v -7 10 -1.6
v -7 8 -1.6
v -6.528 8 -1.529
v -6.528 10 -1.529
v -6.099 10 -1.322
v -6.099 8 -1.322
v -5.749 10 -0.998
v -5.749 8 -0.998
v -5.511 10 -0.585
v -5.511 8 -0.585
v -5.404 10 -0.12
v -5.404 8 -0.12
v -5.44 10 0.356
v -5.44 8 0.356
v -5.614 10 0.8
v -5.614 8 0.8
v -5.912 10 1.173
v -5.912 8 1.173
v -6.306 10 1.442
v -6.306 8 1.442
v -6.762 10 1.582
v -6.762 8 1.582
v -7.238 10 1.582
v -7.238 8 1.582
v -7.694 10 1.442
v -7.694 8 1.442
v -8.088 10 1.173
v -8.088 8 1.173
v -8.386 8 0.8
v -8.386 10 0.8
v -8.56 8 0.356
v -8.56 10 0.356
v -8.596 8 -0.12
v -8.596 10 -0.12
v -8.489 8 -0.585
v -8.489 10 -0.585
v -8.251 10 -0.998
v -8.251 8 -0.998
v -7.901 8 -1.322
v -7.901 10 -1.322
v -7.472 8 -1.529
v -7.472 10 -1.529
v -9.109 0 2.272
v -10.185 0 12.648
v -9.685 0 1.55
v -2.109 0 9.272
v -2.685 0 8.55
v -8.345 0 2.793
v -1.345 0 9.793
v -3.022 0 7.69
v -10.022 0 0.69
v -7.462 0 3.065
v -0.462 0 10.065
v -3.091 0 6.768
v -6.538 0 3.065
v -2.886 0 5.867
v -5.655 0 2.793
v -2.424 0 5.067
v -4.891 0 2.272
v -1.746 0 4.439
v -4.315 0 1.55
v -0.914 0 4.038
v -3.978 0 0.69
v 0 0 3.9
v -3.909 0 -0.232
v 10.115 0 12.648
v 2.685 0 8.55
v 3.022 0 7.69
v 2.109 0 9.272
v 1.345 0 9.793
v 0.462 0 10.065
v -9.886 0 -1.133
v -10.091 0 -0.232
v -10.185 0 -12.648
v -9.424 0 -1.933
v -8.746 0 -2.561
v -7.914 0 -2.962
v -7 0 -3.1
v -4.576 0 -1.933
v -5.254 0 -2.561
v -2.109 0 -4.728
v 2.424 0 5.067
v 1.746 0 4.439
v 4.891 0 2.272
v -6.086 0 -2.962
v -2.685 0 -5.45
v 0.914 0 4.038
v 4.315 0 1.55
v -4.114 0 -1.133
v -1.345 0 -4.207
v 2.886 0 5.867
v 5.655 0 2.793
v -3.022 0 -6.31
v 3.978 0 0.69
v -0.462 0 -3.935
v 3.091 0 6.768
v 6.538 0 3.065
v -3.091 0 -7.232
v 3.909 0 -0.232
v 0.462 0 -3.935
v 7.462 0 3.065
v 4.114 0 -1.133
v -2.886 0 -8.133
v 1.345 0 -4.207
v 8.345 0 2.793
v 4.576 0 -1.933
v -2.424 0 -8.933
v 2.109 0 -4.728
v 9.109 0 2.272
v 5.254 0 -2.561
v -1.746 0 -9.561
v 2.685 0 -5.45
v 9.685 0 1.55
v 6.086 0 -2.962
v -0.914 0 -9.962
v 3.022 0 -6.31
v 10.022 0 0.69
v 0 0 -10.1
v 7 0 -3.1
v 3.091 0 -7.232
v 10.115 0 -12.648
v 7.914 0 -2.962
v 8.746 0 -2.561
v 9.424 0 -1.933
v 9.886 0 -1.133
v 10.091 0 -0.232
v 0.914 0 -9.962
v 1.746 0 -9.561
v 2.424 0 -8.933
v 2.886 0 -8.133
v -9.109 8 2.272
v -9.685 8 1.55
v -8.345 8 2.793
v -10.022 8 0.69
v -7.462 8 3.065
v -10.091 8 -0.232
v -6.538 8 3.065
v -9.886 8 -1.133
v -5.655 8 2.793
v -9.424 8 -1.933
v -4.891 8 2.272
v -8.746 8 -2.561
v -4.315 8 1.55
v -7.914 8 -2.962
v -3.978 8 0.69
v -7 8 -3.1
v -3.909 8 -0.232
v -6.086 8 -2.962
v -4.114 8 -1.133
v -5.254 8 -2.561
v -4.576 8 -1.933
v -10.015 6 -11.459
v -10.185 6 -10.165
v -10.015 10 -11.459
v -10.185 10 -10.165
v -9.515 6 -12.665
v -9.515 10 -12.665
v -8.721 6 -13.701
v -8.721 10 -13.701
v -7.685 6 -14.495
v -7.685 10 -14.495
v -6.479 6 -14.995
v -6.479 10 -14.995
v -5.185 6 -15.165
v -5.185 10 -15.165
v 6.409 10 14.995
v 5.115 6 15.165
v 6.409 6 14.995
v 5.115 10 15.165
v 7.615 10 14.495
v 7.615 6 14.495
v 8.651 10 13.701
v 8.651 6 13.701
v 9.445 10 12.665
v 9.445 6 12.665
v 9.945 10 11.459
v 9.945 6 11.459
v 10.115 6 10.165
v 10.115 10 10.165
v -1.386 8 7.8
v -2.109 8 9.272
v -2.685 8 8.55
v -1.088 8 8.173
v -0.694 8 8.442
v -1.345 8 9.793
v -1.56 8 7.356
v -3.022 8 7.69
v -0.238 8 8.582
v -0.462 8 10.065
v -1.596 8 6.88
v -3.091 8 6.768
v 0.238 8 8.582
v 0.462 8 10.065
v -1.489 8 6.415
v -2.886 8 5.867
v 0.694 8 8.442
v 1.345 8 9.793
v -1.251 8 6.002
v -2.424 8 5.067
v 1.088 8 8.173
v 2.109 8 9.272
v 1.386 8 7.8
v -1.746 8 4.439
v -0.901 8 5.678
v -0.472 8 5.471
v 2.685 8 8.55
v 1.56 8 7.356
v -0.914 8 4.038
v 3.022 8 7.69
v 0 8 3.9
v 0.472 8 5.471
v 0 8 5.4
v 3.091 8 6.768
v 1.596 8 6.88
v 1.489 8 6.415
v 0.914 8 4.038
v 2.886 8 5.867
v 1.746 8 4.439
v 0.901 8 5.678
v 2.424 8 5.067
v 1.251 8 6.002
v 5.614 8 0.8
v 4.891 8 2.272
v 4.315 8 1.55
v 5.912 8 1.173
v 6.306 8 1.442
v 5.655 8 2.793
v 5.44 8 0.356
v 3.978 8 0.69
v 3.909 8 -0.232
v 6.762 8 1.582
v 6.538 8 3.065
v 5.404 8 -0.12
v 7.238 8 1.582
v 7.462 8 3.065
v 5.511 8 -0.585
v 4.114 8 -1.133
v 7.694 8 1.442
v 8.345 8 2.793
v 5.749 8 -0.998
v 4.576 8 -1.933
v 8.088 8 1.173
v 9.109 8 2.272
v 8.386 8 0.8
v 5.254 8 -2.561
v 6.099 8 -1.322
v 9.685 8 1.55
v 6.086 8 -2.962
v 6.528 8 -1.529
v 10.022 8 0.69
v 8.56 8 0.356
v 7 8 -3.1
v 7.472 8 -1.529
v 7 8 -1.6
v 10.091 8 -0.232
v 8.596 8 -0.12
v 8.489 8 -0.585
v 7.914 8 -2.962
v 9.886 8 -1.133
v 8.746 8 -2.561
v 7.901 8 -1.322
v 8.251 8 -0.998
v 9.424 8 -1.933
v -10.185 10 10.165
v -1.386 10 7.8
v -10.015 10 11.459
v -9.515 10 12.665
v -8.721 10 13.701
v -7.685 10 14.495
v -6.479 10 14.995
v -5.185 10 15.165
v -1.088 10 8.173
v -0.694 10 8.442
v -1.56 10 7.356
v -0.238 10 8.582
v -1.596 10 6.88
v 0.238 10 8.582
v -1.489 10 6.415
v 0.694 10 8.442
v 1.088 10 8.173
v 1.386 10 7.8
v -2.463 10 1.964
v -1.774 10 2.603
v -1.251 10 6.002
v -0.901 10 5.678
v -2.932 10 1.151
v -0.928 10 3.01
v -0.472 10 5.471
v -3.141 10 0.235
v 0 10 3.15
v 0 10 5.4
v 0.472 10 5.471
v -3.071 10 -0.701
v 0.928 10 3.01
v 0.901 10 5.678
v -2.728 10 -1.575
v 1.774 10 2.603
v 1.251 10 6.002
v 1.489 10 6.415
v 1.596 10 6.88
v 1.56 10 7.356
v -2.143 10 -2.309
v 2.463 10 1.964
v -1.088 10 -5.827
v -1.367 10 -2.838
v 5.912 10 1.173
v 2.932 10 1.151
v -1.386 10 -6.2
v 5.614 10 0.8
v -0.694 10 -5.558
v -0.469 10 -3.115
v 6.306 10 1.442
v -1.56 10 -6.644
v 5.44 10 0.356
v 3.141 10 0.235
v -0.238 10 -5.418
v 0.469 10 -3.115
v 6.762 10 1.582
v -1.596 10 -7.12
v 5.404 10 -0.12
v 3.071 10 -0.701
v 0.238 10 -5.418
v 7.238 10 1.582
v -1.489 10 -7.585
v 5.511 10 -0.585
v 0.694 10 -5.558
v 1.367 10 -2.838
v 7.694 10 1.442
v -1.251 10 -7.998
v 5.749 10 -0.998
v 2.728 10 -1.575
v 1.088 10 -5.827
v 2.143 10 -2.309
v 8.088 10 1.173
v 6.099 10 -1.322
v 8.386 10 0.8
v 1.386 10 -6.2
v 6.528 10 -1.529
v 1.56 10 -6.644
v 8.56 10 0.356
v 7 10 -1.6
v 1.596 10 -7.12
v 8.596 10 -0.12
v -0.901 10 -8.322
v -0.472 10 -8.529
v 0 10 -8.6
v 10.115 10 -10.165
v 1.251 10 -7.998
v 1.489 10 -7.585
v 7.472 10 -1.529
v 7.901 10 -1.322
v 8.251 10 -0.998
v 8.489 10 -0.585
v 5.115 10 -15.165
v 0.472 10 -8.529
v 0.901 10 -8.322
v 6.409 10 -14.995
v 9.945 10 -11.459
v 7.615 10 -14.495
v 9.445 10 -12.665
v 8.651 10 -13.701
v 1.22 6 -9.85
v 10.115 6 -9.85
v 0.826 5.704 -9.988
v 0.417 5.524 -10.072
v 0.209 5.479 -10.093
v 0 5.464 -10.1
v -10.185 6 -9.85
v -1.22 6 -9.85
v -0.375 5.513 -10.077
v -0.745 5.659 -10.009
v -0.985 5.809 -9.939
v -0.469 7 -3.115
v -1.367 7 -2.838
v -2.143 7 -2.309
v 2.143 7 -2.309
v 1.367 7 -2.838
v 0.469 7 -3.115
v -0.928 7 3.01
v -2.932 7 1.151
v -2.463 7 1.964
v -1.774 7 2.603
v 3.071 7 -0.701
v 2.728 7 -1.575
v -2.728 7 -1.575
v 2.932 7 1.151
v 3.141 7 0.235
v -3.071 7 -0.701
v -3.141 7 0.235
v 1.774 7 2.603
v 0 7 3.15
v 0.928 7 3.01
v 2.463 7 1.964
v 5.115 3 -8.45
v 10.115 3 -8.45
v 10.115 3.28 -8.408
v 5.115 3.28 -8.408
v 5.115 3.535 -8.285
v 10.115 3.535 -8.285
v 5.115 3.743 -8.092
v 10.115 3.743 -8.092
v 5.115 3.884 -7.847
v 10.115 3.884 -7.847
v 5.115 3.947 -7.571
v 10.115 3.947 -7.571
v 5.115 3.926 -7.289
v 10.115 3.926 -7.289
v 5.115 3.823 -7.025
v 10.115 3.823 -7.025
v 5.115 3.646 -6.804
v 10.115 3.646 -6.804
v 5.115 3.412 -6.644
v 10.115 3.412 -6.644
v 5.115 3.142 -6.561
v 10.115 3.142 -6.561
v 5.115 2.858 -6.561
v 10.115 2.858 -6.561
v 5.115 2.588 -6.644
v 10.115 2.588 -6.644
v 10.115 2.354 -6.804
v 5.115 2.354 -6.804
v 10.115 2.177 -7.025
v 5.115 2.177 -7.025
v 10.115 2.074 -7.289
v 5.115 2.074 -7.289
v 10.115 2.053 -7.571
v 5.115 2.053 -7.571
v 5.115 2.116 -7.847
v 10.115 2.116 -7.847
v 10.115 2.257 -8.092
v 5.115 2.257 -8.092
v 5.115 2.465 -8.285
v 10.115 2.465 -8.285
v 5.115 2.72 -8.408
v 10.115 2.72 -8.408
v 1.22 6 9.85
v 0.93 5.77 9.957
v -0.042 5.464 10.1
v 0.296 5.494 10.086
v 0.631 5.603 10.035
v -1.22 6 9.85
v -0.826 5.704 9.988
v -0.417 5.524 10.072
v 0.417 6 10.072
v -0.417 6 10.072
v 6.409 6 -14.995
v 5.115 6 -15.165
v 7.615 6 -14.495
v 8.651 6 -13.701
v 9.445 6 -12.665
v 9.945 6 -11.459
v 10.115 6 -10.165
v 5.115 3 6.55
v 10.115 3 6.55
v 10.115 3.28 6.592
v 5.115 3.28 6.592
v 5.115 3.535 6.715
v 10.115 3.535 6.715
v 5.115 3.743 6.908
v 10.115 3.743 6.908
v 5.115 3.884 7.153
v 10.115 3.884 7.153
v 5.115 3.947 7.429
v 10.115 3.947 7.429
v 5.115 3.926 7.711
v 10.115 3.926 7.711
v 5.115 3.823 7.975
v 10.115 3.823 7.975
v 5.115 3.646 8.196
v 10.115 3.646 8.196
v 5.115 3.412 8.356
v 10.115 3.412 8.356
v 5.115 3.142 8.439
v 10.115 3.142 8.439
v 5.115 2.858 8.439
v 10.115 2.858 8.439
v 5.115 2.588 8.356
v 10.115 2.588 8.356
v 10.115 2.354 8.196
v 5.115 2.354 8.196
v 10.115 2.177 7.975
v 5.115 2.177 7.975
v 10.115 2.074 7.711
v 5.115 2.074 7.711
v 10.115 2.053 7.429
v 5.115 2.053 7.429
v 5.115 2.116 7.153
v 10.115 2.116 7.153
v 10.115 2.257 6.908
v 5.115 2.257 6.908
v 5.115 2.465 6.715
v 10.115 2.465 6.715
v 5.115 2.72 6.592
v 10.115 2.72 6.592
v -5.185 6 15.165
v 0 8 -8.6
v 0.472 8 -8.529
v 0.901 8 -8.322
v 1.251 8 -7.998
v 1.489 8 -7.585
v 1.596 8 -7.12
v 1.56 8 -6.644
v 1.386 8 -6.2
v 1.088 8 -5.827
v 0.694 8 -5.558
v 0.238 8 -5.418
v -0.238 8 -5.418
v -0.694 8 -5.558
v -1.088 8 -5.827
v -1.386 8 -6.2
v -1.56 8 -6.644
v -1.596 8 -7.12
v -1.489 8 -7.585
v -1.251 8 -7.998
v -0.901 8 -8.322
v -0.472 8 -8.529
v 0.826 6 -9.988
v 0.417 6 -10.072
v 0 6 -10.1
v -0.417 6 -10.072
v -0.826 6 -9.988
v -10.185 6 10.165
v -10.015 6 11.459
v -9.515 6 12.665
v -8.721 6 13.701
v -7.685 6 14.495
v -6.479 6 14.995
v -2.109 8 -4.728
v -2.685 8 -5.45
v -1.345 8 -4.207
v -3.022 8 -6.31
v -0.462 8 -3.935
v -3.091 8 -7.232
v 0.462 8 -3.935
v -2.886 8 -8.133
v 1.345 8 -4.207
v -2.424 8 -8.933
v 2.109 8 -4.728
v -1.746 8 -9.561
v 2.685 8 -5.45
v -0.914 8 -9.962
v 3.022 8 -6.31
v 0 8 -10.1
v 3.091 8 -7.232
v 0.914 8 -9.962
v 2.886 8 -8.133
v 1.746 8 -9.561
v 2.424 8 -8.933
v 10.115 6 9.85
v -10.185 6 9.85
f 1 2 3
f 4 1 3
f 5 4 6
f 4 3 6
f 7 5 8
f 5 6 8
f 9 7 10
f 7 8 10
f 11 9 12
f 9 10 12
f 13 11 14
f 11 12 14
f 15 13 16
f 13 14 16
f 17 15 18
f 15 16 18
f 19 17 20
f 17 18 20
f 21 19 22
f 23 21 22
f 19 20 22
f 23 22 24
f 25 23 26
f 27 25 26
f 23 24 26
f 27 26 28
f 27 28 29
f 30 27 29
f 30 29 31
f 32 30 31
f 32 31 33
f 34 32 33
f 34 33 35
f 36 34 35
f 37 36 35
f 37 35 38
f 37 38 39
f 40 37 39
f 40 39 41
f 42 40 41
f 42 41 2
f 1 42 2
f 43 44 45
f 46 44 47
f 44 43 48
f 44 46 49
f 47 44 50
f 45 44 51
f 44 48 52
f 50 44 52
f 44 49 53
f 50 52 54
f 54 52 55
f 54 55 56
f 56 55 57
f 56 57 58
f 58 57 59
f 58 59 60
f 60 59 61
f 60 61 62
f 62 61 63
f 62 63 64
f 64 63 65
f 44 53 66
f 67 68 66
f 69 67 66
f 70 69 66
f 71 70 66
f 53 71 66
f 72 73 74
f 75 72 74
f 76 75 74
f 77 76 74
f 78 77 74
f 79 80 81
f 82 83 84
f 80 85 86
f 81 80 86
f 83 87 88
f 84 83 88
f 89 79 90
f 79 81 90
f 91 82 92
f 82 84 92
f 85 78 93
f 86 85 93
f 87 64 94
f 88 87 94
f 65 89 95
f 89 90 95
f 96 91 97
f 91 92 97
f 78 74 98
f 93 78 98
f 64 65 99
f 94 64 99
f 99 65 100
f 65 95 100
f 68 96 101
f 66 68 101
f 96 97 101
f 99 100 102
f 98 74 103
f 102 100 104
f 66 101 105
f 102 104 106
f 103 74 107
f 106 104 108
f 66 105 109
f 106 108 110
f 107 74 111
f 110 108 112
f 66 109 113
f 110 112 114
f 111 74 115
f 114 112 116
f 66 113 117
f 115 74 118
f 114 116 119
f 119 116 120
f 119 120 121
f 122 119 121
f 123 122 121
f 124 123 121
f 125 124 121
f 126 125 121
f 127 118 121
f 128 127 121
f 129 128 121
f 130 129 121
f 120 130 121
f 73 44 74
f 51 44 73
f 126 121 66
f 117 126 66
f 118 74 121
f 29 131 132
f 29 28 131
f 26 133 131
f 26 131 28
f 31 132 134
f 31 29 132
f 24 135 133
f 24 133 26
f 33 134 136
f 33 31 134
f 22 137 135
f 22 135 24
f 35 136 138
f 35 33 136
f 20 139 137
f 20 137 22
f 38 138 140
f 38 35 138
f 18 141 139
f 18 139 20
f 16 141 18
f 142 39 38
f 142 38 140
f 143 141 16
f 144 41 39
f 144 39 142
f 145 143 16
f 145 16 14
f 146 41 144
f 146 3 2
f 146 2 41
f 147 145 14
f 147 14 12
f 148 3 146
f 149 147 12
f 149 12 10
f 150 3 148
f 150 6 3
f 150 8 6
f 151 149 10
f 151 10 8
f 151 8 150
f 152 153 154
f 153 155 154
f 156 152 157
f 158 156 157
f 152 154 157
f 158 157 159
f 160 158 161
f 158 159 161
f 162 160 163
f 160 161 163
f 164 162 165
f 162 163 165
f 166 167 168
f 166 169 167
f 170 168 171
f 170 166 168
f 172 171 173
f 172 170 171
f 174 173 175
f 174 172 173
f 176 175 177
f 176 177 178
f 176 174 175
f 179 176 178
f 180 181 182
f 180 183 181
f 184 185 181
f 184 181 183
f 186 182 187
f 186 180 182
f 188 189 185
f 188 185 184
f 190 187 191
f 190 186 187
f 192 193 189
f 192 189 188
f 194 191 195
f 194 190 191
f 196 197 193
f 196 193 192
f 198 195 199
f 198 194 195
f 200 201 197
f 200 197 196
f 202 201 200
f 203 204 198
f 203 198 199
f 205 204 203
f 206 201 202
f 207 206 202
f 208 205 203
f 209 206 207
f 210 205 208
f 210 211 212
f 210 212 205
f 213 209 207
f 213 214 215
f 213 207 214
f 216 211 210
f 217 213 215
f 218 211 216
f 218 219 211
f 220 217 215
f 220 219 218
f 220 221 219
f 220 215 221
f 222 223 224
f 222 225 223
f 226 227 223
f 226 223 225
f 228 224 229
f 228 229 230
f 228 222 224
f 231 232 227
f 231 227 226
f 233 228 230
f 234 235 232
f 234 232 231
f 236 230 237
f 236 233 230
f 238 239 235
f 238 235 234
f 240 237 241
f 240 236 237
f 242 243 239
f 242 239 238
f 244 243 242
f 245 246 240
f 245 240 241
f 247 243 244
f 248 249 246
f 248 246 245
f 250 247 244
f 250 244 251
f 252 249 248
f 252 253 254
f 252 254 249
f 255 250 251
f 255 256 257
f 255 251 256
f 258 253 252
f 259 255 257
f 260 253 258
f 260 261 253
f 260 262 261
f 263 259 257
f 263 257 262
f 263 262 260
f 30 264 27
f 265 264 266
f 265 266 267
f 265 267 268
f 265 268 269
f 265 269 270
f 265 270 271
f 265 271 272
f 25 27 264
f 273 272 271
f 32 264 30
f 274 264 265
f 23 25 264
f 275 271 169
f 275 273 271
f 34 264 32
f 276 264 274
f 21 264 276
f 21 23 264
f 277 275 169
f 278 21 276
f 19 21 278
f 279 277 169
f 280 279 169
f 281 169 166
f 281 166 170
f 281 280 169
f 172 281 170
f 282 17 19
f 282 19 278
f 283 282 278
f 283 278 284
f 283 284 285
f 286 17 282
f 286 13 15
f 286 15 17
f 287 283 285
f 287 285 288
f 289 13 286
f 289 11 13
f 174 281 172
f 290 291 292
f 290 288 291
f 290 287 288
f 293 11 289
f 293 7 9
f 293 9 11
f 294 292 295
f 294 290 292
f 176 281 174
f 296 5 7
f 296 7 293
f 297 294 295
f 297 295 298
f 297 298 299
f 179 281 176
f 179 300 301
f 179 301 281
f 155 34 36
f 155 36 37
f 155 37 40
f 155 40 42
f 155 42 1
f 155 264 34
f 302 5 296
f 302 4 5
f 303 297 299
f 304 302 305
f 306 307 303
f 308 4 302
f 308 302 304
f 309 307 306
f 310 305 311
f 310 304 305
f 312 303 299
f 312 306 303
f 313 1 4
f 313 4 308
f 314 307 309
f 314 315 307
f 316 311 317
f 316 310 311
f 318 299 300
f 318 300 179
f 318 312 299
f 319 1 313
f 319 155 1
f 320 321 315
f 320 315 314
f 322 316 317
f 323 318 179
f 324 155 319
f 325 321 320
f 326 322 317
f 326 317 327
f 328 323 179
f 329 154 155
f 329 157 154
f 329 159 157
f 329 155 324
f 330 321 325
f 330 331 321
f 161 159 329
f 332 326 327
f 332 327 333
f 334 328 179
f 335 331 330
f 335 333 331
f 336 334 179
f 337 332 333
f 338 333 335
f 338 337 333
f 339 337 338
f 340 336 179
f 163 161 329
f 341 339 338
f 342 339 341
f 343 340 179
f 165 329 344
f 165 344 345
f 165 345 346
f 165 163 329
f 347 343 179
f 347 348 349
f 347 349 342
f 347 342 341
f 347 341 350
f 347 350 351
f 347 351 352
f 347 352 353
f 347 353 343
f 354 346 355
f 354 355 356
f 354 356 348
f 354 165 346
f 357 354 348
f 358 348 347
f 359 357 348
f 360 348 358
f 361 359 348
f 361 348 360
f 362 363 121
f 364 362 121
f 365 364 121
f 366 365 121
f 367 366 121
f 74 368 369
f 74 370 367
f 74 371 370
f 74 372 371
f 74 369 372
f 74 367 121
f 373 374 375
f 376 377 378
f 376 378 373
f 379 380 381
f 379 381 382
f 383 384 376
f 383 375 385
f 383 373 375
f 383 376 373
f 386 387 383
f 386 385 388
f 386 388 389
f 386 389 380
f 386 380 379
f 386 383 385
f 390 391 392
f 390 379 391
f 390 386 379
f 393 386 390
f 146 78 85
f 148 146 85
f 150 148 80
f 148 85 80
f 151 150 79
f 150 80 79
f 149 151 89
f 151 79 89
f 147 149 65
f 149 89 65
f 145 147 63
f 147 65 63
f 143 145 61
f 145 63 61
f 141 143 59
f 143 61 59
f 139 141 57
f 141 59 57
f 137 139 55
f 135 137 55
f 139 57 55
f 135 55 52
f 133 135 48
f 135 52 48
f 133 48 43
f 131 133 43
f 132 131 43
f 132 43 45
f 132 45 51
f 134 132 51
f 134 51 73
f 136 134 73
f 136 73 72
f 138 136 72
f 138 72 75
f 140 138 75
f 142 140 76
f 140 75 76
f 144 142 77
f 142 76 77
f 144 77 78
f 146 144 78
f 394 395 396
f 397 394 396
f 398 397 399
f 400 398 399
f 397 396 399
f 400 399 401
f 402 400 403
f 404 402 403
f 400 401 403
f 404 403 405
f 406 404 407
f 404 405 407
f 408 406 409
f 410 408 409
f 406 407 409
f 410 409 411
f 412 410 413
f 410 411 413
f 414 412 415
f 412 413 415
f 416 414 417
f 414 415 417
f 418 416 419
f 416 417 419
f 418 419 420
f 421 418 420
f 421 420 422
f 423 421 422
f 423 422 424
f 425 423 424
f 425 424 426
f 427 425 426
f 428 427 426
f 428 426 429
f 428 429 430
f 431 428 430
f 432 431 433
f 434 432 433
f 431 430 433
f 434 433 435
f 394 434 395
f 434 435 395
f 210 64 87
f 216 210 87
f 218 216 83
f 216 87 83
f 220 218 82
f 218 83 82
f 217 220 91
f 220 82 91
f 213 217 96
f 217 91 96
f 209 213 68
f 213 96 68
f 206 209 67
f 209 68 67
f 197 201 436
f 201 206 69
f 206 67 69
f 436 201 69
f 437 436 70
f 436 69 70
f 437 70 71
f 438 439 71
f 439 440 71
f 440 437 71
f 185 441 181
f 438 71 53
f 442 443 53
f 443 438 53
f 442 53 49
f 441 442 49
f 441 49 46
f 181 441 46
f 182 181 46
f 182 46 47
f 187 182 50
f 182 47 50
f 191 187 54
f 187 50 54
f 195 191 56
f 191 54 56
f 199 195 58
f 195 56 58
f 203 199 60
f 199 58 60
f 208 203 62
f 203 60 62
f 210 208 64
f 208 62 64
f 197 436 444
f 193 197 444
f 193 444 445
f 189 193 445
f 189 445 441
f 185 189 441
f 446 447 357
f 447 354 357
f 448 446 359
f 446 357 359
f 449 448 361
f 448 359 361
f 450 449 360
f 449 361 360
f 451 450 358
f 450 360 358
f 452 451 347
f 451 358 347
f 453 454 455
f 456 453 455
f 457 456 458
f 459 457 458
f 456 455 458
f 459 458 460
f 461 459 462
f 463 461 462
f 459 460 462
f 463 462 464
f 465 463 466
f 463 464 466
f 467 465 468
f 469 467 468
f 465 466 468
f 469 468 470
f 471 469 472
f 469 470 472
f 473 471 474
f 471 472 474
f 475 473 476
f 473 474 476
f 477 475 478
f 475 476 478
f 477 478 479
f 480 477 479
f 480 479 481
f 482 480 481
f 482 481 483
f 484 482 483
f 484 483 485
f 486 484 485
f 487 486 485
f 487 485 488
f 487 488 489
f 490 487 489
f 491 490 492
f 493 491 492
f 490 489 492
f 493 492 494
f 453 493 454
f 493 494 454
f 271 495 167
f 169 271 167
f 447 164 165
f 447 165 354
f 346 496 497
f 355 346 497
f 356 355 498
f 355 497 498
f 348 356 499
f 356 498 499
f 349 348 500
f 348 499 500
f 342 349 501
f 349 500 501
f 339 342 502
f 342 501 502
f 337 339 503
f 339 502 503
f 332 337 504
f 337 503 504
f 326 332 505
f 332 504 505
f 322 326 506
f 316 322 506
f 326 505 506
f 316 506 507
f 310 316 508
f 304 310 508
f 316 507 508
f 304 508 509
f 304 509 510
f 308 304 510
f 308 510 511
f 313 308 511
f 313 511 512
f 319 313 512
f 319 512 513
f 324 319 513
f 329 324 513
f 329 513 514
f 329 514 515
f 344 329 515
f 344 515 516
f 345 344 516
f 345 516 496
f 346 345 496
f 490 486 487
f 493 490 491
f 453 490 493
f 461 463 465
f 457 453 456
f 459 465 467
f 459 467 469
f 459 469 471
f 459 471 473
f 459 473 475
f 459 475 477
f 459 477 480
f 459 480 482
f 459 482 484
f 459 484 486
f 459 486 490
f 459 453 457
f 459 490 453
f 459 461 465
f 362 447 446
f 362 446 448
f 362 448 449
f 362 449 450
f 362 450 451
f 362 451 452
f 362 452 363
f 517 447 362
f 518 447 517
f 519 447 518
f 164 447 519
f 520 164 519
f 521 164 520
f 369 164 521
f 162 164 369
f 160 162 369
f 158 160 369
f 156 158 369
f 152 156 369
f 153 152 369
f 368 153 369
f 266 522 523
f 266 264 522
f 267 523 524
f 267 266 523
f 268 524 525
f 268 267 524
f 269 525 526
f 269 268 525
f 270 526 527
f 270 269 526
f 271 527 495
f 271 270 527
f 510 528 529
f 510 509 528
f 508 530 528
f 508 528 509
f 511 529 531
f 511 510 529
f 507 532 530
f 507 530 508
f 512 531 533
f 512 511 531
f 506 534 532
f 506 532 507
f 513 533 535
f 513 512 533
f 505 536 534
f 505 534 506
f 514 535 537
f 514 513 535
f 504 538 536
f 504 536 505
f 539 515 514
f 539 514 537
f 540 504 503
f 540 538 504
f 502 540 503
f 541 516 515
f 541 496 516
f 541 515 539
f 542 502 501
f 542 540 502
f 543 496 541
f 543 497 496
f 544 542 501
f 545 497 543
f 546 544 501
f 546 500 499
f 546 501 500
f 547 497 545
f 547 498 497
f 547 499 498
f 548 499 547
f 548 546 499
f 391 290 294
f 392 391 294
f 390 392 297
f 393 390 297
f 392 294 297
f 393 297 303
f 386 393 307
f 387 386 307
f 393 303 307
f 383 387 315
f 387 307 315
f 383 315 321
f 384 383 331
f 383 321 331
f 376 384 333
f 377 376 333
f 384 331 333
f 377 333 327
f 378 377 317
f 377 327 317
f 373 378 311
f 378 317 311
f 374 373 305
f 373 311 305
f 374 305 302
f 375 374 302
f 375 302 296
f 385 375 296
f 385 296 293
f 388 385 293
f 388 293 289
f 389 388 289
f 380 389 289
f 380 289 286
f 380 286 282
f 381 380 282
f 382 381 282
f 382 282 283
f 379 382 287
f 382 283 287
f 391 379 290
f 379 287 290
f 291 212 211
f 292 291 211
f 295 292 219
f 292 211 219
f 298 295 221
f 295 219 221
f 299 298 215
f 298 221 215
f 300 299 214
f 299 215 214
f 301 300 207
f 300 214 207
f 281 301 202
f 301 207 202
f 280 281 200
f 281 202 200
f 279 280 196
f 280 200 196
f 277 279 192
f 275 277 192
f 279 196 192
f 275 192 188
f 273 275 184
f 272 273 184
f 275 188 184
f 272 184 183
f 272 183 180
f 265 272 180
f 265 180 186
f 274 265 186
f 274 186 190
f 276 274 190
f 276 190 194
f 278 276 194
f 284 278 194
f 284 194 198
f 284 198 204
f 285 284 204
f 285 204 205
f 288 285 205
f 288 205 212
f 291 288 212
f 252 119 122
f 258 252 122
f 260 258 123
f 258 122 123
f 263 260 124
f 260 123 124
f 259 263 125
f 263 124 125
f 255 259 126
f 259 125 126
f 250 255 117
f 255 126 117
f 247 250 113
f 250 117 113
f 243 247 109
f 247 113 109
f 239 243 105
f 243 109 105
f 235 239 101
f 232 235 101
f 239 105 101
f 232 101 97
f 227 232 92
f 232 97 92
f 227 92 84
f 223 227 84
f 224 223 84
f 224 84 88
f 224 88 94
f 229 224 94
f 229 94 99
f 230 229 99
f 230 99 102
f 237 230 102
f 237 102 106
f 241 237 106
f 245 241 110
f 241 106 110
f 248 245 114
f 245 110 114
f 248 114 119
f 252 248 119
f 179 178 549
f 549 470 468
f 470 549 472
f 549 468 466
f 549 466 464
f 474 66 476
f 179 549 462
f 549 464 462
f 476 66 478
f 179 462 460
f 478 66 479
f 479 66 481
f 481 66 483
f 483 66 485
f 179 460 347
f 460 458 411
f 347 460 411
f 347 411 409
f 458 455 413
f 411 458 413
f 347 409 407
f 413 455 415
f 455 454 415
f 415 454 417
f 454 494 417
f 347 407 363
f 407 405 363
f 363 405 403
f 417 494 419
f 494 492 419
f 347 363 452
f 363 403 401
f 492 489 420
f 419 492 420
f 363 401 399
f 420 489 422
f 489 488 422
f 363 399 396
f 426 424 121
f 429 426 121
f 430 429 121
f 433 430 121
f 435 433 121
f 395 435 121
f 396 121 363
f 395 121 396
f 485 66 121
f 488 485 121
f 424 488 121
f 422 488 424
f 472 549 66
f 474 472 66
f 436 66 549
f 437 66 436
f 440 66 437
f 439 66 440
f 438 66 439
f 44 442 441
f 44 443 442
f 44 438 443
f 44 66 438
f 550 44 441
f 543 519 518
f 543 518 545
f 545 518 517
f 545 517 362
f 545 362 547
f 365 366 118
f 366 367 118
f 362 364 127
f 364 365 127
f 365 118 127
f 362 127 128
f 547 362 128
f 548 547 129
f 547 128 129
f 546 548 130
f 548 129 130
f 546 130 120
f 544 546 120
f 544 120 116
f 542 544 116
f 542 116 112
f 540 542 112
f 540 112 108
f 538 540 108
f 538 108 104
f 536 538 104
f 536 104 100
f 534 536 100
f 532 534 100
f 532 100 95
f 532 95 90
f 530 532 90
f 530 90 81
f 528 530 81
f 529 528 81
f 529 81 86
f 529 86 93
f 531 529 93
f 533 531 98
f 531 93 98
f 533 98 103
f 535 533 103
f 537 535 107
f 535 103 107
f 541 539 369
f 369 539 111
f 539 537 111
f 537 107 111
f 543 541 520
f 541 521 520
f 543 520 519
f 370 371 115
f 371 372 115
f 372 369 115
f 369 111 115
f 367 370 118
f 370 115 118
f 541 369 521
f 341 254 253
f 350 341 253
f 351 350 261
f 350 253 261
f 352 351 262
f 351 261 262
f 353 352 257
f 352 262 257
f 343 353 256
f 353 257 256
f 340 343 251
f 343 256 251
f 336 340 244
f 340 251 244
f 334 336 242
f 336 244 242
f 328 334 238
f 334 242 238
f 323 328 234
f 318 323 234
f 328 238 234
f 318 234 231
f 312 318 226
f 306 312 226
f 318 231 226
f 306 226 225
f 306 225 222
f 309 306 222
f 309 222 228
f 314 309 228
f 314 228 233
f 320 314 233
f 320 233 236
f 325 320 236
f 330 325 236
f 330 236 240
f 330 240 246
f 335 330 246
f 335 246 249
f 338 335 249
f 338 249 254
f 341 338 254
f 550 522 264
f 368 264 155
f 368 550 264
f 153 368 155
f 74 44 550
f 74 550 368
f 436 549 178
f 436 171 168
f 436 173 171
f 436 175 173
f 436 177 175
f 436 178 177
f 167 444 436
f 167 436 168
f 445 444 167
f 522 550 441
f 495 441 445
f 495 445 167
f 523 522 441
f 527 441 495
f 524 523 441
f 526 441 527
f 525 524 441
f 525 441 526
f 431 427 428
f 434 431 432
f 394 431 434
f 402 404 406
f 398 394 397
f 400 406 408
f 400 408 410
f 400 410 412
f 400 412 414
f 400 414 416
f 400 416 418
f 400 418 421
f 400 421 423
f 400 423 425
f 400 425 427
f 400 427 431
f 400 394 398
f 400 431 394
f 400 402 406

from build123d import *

# Parameters (mm, degrees)
SKETCH_1_W          = 20.3
SKETCH_1_H          = 30.33
EXTRUDE_1_DEPTH     = 10
CUT_EXTRUDE_1_DEPTH = 28.240910869
SKETCH_3_R          = 1.6
CUT_EXTRUDE_2_DEPTH = 21.825740083
SKETCH_4_R          = 3.1
CUT_EXTRUDE_3_DEPTH = 8
SKETCH_5_R          = 0.95
CUT_EXTRUDE_4_DEPTH = 5
SKETCH_6_R          = 3.15
CUT_EXTRUDE_5_DEPTH = 3
FILLET_2_R          = 5


with BuildPart() as part:
    # 草图1 → 凸台-拉伸1 (new body)
    with BuildSketch(Plane(origin=(0, 0, 0), x_dir=(1, 0, 0), z_dir=(0, 1, 0))):
        with Locations((-0.035, 0)):
            Rectangle(SKETCH_1_W, SKETCH_1_H)
    extrude(amount=EXTRUDE_1_DEPTH)

    # 草图2 → 切除-拉伸1 (cut, through all)
    with BuildSketch(Plane.ZY.offset(10.185)):
        Polygon((-15.165, 6), (-9.85, 6), (-12.647845949, 0), (-15.165, 0), align=None)
        Polygon((12.647845949, 0), (9.85, 6), (15.165, 6), (15.165, 0), align=None)
    extrude(amount=-CUT_EXTRUDE_1_DEPTH, mode=Mode.SUBTRACT)

    # 草图3 → 切除-拉伸2 (cut, through all)
    with BuildSketch(Plane.XZ):
        with Locations(Location((0, 7, 0), (0, 0, 270))):
            Circle(SKETCH_3_R)
        with Locations(Location((7, 0, 0), (0, 0, 270))):
            Circle(SKETCH_3_R)
        with Locations(Location((0, -7, 0), (0, 0, 270))):
            Circle(SKETCH_3_R)
        with Locations(Location((-7, 0, 0), (0, 0, 270))):
            Circle(SKETCH_3_R)
    extrude(amount=-CUT_EXTRUDE_2_DEPTH, mode=Mode.SUBTRACT)

    # 草图4 → 切除-拉伸3 (cut)
    with BuildSketch(Plane.XZ):
        with Locations(Location((0, 7, 0), (0, 0, 270))):
            Circle(SKETCH_4_R)
        with Locations(Location((7, 0, 0), (0, 0, 270))):
            Circle(SKETCH_4_R)
        with Locations(Location((0, -7, 0), (0, 0, 270))):
            Circle(SKETCH_4_R)
        with Locations(Location((-7, 0, 0), (0, 0, 270))):
            Circle(SKETCH_4_R)
    extrude(amount=-CUT_EXTRUDE_3_DEPTH, mode=Mode.SUBTRACT)

    # 草图5 → 切除-拉伸4 (cut)
    with BuildSketch(Plane(origin=(10.115, 0, 0), x_dir=(0, 0, -1), z_dir=(1, 0, 0))):
        with Locations((-7.5, 3)):
            Circle(SKETCH_5_R)
        with Locations((7.5, 3)):
            Circle(SKETCH_5_R)
    extrude(amount=-CUT_EXTRUDE_4_DEPTH, mode=Mode.SUBTRACT)

    # 草图6 → 切除-拉伸5 (cut)
    with BuildSketch(Plane(origin=(0, 10, 0), x_dir=(1, 0, 0), z_dir=(0, 1, 0))):
        with Locations(Location((0, 0, 0), (0, 0, 270))):
            Circle(SKETCH_6_R)
    extrude(amount=-CUT_EXTRUDE_5_DEPTH, mode=Mode.SUBTRACT)

    # 圆角2
    fillet_2_edges = [part.edges().sort_by_distance(p)[0] for p in [
        (-10.185, 8, -15.165),
        (10.115, 8, -15.165),
        (10.115, 8, 15.165),
        (-10.185, 8, 15.165),
    ]]
    fillet(fillet_2_edges, radius=FILLET_2_R)


solid = part.part
